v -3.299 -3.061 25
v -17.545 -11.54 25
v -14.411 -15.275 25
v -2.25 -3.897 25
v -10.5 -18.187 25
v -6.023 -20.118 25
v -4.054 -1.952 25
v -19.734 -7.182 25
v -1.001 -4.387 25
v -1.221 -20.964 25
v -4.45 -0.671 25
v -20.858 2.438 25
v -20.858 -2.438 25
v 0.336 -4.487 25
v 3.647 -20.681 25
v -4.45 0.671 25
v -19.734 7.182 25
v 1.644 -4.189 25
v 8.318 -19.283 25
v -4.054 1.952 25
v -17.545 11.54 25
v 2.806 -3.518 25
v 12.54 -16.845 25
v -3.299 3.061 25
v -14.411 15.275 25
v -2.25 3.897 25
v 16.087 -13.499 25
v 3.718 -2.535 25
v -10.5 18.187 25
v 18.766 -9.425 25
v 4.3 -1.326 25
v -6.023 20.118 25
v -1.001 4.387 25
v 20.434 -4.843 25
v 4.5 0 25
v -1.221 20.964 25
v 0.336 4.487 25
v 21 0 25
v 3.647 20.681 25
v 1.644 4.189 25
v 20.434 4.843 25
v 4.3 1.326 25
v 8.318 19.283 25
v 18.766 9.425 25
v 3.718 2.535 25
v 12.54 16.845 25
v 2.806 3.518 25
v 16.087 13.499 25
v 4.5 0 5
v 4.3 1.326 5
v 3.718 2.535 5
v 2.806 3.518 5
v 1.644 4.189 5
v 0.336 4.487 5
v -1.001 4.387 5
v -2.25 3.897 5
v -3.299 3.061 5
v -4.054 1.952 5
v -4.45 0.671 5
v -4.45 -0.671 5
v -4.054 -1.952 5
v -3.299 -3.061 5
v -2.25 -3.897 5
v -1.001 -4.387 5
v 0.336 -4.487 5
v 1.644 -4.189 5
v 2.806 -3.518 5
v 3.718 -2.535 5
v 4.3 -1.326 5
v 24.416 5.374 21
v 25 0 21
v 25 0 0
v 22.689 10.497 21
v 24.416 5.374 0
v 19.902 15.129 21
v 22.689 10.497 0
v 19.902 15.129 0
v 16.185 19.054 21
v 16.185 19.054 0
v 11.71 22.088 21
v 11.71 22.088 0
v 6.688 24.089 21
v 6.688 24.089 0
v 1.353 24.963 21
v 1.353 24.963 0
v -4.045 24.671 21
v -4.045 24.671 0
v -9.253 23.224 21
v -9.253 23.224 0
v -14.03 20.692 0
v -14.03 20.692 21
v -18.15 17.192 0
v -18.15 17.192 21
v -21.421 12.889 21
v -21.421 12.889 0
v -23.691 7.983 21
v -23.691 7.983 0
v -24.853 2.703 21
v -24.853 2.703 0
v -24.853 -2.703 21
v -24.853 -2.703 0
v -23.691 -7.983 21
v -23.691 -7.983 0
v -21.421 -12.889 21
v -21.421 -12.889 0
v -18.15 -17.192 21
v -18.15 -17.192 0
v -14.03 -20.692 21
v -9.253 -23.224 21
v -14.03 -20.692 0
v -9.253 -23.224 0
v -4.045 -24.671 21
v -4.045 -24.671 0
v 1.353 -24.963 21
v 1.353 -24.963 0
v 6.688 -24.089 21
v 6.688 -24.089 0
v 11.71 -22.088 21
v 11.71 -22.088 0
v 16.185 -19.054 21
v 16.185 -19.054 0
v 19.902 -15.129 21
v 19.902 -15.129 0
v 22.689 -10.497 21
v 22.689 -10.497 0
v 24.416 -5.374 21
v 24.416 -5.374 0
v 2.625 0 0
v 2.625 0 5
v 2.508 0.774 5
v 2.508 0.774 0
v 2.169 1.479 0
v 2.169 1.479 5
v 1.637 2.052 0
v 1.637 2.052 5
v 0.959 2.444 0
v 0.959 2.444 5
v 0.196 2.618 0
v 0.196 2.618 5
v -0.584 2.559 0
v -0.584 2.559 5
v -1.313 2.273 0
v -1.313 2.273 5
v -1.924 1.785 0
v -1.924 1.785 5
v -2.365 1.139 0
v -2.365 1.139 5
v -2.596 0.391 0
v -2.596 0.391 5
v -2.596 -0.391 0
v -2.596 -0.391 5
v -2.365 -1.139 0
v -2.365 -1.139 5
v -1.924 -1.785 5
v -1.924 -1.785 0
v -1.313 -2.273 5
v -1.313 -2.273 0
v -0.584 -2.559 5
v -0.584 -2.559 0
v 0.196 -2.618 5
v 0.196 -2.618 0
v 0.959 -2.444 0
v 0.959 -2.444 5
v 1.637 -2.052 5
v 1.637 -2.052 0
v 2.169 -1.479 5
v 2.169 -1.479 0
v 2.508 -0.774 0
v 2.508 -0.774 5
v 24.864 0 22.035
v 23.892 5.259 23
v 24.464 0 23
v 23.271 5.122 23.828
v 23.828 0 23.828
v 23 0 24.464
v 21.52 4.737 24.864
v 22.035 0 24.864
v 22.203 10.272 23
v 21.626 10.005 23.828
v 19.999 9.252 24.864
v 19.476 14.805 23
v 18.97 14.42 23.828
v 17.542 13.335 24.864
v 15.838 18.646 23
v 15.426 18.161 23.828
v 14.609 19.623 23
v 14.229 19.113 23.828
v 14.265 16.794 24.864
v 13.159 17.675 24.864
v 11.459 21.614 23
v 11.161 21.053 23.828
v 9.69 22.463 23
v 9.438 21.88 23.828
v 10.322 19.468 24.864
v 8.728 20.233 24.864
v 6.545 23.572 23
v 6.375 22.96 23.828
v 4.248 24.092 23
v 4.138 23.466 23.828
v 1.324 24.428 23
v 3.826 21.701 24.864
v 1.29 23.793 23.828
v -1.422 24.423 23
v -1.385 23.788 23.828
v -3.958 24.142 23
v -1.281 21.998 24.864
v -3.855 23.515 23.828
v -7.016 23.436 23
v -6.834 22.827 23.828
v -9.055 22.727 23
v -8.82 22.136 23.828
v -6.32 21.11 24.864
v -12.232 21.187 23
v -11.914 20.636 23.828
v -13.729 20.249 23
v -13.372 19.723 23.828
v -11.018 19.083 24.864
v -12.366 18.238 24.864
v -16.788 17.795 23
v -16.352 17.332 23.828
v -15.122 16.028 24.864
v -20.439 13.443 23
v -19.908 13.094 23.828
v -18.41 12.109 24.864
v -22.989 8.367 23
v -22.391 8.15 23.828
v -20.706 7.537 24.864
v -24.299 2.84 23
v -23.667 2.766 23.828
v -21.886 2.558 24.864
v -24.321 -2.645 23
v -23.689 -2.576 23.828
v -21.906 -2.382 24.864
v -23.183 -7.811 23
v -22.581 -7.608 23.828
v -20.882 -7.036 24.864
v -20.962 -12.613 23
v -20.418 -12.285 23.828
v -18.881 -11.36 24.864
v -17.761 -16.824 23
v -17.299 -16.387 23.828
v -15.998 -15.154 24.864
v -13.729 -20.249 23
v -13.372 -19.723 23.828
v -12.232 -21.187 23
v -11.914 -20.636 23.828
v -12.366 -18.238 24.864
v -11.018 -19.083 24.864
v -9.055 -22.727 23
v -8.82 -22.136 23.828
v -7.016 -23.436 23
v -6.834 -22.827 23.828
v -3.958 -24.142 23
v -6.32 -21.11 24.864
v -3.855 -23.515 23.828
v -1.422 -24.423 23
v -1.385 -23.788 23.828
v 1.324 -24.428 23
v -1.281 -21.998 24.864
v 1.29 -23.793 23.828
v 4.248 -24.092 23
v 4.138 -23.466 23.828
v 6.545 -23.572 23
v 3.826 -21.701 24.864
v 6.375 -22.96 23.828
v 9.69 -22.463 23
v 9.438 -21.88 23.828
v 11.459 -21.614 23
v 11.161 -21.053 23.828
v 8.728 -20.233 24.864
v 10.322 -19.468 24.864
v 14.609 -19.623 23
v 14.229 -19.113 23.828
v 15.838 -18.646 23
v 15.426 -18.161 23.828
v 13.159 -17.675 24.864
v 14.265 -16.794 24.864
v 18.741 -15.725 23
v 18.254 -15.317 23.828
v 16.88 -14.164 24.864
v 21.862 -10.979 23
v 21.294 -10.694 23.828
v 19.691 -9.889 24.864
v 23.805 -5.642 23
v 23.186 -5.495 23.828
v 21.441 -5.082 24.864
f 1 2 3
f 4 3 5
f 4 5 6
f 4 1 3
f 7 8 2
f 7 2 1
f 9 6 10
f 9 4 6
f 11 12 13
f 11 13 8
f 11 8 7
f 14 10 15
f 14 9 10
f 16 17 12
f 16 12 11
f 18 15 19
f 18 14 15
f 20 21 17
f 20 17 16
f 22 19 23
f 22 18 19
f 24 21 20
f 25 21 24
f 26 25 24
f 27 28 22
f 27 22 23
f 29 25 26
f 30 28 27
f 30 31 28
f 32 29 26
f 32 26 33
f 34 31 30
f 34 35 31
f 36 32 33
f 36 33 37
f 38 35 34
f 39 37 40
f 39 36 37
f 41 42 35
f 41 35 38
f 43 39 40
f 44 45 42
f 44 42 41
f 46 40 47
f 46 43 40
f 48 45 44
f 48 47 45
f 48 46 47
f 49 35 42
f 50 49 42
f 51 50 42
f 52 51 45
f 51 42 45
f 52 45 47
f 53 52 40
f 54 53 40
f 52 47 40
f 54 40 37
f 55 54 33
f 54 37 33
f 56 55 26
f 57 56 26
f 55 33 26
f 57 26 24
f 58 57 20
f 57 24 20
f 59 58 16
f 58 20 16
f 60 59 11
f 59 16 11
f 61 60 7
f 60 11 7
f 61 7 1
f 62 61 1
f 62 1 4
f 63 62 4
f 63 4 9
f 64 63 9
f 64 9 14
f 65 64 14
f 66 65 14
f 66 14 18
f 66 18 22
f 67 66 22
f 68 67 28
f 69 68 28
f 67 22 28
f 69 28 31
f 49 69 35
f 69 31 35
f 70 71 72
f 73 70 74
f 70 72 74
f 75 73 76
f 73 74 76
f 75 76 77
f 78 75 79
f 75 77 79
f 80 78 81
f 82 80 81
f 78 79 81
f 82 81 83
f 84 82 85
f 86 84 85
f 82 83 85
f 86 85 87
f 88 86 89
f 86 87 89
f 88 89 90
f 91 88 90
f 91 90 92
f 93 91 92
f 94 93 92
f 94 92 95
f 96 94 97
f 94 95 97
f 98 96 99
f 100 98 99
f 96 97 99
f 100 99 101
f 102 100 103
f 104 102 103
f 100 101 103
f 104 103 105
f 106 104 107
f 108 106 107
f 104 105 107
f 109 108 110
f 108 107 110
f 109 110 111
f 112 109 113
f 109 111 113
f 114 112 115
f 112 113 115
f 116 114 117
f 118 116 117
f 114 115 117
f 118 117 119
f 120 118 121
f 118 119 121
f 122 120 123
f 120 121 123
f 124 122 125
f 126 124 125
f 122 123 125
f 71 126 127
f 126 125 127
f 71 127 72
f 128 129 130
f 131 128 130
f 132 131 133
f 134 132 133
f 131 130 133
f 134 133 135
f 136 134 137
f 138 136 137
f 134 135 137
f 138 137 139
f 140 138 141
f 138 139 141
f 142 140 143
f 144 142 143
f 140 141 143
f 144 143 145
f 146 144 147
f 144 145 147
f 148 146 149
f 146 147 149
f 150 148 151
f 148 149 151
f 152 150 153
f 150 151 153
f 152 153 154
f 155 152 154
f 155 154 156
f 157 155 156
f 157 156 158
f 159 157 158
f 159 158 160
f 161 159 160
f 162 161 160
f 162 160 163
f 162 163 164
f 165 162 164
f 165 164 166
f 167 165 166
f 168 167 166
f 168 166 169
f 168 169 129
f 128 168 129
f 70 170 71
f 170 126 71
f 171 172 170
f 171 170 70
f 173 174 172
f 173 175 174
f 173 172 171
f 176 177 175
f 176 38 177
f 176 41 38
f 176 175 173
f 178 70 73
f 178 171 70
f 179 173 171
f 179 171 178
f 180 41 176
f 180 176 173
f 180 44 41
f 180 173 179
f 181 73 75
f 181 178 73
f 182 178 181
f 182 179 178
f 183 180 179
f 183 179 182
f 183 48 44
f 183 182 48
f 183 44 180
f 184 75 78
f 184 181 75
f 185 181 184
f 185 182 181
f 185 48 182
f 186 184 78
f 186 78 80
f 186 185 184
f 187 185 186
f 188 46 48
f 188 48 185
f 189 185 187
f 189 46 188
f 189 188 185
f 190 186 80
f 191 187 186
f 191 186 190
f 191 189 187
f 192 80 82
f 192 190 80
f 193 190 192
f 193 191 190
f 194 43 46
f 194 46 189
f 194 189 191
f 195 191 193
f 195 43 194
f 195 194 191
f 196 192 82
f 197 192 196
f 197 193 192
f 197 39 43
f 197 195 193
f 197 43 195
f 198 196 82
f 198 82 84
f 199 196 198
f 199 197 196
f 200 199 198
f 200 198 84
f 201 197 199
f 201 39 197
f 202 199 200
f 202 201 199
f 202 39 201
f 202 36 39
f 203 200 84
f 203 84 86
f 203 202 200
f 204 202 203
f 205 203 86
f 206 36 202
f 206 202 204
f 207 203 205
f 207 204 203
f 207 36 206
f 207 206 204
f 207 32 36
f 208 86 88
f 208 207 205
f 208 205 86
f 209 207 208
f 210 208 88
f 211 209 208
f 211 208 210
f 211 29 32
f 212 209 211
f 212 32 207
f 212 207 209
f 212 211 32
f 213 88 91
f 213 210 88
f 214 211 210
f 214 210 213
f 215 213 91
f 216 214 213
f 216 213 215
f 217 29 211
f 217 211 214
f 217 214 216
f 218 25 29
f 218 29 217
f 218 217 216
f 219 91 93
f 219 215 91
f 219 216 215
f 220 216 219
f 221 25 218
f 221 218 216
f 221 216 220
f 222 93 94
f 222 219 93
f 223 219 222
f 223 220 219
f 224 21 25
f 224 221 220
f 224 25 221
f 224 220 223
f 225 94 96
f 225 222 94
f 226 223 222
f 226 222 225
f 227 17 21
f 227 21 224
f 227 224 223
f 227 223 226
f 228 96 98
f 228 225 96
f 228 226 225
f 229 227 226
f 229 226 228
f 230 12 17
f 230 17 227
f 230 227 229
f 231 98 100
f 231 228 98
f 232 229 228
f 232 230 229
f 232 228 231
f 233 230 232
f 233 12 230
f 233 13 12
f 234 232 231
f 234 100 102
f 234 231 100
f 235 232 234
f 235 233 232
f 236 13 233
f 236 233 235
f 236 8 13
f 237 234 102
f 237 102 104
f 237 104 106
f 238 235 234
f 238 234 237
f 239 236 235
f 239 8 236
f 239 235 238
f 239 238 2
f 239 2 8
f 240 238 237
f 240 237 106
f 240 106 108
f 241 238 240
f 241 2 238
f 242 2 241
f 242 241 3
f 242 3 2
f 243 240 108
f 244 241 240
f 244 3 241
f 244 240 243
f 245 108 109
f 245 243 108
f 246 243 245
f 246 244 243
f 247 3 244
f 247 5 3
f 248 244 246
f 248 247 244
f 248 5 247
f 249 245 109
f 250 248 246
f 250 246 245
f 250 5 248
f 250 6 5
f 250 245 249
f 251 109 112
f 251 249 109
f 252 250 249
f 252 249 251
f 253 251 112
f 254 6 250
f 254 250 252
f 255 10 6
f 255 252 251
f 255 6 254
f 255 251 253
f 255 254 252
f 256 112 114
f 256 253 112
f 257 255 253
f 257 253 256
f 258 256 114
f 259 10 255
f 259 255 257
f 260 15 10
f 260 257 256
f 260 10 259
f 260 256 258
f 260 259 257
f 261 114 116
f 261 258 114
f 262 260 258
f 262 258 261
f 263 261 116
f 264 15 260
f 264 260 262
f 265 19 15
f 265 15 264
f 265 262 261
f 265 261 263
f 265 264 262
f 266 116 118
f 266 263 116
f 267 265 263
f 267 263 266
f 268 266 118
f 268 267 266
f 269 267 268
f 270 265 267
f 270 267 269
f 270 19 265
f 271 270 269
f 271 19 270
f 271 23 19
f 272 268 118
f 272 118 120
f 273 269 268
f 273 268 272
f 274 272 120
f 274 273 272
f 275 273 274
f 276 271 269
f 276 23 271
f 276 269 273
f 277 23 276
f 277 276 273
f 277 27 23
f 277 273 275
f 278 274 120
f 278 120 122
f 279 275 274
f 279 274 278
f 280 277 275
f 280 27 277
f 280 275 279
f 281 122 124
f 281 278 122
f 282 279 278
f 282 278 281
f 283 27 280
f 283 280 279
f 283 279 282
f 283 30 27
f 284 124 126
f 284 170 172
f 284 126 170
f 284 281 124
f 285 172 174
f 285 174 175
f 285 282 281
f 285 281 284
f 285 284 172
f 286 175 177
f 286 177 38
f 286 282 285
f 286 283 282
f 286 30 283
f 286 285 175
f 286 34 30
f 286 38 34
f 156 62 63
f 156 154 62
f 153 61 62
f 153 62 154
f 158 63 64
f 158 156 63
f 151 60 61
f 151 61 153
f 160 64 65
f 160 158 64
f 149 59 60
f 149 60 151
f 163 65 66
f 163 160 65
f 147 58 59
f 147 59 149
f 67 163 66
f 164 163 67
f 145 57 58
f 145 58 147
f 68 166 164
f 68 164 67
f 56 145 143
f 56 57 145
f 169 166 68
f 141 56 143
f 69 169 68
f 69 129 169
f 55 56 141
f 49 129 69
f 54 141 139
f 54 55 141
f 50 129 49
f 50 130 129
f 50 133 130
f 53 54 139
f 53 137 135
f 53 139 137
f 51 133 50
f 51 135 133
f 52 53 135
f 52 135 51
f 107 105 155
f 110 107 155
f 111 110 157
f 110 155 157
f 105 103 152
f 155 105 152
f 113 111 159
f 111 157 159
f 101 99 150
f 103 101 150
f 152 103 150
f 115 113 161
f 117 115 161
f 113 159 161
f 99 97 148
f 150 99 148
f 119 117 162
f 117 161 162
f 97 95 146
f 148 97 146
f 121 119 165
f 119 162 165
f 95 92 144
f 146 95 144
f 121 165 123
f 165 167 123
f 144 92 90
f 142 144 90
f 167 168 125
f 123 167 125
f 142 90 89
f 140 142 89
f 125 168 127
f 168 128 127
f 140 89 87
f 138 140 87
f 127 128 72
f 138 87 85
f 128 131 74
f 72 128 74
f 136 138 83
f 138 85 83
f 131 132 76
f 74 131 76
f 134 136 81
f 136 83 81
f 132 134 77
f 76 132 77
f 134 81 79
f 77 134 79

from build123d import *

# Parameters (mm, degrees)
F0_R     = 25
F1_DEPTH = 25
F2_R     = 2.625
F3_DEPTH = 25
F4_R     = 4.5
F5_DEPTH = 20
F6_R     = 4


with BuildPart() as f1:
    # F0 (on Top) → F1 (new body)
    with BuildSketch(Plane.XY):
        Circle(F0_R)
    extrude(amount=F1_DEPTH)

    # F2 (on face) → F3 (cut)
    with BuildSketch(Plane.XY.offset(25)):
        Circle(F2_R)
    extrude(amount=-F3_DEPTH, mode=Mode.SUBTRACT)

    # F4 (on face) → F5 (cut)
    with BuildSketch(Plane.XY.offset(25)):
        Circle(F4_R)
    extrude(amount=-F5_DEPTH, mode=Mode.SUBTRACT)

    # F6
    f6_edges = [f1.edges().sort_by_distance(p)[0] for p in [
        (-25, 0, 25),
    ]]
    fillet(f6_edges, radius=F6_R)


solid = f1.part
